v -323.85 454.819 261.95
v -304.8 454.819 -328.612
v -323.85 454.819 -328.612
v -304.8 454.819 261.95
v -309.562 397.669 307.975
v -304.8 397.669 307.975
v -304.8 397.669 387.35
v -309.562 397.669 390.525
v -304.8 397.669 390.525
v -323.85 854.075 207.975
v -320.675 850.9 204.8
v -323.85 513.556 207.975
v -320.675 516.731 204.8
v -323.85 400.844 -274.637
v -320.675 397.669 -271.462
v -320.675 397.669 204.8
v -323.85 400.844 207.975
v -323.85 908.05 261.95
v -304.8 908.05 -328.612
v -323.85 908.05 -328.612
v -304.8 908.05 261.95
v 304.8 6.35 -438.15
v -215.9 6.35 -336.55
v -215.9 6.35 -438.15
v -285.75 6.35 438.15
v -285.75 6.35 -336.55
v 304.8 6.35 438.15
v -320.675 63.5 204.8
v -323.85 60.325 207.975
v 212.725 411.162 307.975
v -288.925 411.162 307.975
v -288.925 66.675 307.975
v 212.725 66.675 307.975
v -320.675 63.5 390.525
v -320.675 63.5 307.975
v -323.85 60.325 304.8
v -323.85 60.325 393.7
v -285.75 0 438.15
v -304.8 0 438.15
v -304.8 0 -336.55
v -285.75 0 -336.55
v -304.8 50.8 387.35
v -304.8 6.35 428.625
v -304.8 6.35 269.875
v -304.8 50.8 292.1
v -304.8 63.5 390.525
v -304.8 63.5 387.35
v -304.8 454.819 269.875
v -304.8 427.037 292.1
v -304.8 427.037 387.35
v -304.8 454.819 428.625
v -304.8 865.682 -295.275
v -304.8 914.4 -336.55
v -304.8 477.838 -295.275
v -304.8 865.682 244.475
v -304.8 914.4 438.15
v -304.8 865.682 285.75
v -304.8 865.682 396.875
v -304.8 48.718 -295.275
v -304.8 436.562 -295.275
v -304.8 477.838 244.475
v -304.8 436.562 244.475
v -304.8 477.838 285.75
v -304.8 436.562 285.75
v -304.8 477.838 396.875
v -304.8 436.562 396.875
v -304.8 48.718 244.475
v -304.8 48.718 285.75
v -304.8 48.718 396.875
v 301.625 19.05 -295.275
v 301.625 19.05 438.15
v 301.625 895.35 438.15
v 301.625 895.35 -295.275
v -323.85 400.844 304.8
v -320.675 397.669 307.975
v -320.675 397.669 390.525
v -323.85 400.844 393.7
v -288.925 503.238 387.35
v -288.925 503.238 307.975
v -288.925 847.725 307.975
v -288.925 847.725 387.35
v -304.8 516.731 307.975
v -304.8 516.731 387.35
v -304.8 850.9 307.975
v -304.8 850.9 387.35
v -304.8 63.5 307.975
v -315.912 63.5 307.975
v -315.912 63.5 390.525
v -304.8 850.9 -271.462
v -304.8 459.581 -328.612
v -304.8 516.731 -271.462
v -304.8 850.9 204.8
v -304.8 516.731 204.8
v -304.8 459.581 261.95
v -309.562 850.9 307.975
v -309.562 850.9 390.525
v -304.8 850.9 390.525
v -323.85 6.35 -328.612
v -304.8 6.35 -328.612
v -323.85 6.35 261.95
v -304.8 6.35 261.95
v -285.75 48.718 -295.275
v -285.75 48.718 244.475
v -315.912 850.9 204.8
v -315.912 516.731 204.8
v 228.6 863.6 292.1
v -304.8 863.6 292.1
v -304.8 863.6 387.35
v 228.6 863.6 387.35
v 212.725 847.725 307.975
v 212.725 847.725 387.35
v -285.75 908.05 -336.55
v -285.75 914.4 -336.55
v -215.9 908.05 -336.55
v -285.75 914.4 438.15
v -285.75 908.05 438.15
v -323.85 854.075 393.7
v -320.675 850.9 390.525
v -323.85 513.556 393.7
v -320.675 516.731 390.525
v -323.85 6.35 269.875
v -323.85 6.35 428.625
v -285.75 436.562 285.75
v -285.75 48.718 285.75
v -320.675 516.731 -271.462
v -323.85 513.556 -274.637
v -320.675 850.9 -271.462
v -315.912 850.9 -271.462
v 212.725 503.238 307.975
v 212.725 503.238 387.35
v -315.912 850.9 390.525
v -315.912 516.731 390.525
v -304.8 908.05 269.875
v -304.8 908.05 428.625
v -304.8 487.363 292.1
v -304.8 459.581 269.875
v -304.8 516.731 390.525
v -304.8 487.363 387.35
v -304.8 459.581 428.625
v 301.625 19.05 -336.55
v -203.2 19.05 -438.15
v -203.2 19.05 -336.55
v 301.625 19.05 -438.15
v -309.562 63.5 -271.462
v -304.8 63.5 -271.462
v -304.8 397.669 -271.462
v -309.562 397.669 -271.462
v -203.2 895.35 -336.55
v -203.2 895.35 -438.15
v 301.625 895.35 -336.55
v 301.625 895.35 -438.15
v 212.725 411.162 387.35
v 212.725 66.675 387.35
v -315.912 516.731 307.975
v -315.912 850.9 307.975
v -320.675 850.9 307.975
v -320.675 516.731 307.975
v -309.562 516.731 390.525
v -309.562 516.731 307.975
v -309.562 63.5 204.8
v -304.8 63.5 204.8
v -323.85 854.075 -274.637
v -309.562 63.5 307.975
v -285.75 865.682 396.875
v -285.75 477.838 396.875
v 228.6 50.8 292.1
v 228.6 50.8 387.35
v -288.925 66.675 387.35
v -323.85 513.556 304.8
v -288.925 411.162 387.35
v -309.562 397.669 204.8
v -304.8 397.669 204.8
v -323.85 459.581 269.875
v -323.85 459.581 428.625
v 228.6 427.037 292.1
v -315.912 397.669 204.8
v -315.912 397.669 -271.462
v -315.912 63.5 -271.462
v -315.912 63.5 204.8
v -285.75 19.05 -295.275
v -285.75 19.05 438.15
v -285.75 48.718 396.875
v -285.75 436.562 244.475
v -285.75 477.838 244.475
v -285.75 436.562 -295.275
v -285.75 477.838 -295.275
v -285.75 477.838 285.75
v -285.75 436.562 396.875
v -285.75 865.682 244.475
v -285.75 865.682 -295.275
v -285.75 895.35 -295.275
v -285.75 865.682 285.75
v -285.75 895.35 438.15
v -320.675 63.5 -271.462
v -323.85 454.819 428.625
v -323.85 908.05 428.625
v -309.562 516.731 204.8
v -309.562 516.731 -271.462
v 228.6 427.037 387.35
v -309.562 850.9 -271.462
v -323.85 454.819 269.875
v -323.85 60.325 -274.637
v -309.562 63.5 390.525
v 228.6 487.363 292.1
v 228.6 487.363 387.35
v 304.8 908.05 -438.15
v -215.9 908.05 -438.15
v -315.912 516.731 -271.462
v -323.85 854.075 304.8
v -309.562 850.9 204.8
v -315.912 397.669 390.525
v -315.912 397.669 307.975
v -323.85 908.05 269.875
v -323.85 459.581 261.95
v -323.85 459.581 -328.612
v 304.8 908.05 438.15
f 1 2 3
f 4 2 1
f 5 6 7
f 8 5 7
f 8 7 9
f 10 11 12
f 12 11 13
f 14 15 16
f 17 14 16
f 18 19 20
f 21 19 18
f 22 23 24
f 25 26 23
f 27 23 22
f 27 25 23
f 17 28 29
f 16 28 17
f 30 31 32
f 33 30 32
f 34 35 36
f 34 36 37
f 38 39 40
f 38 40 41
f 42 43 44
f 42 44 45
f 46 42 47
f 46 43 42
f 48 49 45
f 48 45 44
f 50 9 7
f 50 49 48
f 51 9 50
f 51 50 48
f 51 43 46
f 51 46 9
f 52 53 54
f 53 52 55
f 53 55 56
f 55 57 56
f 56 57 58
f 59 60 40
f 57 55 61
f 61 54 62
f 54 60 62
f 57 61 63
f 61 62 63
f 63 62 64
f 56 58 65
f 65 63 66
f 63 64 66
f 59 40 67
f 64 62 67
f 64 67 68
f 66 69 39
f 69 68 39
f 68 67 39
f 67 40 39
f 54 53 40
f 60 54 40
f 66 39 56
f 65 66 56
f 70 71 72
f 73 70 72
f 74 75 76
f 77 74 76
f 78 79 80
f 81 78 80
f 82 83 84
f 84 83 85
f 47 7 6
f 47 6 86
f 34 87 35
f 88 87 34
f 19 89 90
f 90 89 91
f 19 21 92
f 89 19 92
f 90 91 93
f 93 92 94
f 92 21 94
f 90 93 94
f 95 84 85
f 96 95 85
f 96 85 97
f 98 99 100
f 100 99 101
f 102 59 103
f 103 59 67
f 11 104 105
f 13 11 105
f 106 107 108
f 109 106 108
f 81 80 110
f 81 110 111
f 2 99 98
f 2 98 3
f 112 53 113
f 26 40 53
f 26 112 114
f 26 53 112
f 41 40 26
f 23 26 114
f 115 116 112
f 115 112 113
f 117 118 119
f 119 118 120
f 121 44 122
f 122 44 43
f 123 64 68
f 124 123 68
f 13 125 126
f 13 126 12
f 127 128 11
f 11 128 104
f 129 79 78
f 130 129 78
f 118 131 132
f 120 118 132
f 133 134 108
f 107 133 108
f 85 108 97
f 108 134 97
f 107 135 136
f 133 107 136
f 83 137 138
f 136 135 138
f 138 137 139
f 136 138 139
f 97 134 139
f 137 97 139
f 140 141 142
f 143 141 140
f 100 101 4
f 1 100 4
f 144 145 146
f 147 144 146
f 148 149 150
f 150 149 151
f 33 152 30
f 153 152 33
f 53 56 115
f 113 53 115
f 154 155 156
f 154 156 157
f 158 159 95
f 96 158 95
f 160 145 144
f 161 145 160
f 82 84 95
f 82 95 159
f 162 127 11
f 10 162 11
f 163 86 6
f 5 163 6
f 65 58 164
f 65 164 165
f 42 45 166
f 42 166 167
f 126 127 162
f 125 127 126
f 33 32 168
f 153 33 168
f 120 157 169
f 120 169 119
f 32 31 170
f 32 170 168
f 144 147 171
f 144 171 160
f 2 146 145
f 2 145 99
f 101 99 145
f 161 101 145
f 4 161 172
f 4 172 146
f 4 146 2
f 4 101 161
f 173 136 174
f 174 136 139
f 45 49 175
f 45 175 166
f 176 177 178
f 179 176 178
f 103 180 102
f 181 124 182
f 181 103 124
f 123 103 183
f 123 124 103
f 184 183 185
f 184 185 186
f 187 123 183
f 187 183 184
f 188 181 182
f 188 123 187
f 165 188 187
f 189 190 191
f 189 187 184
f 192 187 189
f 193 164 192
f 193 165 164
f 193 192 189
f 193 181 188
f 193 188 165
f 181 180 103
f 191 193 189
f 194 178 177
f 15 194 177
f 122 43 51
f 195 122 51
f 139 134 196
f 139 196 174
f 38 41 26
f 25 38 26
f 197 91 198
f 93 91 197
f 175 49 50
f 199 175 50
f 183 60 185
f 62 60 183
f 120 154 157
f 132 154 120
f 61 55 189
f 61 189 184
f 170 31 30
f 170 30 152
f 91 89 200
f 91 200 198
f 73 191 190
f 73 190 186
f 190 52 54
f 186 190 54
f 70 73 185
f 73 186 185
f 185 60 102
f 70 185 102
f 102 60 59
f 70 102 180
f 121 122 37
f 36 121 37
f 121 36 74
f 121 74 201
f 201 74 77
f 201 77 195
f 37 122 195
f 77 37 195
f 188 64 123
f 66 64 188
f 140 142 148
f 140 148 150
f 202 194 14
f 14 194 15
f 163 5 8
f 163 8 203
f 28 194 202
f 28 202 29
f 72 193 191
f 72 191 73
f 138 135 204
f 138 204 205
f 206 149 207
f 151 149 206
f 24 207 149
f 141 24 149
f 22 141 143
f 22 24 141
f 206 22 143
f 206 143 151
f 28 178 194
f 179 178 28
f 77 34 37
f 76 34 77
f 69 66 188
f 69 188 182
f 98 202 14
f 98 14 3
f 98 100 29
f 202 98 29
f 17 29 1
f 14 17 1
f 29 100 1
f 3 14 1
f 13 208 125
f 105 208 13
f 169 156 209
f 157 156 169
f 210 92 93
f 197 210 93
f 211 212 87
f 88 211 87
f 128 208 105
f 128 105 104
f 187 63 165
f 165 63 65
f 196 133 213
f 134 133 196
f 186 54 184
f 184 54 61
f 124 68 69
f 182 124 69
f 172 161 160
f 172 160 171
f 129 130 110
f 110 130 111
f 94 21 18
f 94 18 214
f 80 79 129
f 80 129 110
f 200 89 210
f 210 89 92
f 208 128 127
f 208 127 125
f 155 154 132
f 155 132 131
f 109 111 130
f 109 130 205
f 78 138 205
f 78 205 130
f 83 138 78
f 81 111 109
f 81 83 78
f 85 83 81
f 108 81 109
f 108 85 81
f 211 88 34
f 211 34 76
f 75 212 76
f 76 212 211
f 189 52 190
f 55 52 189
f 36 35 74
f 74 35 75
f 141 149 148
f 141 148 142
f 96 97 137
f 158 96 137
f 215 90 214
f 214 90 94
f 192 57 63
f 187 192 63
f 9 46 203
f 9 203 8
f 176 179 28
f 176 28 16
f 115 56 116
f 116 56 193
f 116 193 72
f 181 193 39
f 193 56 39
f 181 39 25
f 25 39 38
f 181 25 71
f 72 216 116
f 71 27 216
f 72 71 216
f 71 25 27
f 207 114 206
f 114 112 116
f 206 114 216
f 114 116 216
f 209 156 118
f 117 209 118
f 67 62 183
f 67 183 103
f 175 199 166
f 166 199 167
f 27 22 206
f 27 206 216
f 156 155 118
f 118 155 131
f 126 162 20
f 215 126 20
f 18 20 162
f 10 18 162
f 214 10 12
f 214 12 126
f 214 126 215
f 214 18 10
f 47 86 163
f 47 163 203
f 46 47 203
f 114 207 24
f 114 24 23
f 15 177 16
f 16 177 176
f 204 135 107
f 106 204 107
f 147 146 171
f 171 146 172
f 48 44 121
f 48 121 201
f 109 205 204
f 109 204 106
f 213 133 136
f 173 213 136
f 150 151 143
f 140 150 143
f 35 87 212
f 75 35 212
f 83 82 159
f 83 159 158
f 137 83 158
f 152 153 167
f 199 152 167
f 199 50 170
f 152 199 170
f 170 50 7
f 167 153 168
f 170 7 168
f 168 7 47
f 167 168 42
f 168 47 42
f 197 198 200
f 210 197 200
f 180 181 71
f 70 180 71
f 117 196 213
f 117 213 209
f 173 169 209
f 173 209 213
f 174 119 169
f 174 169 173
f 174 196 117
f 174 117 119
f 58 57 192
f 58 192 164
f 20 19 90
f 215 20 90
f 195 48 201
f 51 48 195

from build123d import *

# Parameters (mm, degrees)
F0_W          = 609.6
F0_H          = 876.3
F1_DEPTH      = 914.4
F2_W          = 88.9
F2_H          = 101.6
F3_DEPTH      = 914.401
F4_W          = 816.9639344262
F4_H          = 692.15
F5_DEPTH      = 19.05
F6_W          = 590.55
F6_H          = 6.35
F7_DEPTH      = 876.301
F8_W          = 587.375
F8_H          = 876.3
F9_DEPTH      = 733.425
F10_W         = 387.8444672131
F10_H         = 41.275
F10_W_2       = 41.275
F10_H_2       = 111.125
F10_H_3       = 539.75
F11_DEPTH     = 19.05
F12_W         = 448.46875
F12_H         = 590.5627
F12_W_2       = 334.16875
F12_H_2       = 476.2627
F13_DEPTH     = 19.05
F14_W         = 6.35
F14_H         = 334.16875
F15_DEPTH     = 476.2627
F16_SIZE      = 3.175
F17_W         = 448.46875
F17_H         = 158.75
F17_W_2       = 334.16875
F17_H_2       = 82.55
F18_DEPTH     = 19.05
F19_W         = 6.35
F19_H         = 334.16875
F20_DEPTH     = 82.55
F21_SIZE      = 3.175
F22_W         = 504.825
F22_H         = 876.3
F23_DEPTH     = 101.6
F24_W         = 376.2375
F24_H         = 95.25
F25_DEPTH     = 533.4
F26_T         = 15.875
F26_T3_DEPTH  = 37.249261314
F26_T5_DEPTH  = 37.249261314
F26_T7_DEPTH  = 37.249261314
F26_T9_DEPTH  = 37.249261314
F26_T11_DEPTH = 36.5125
F26_T13_DEPTH = 365.91875
F26_T15_DEPTH = 114.3
F26_T17_DEPTH = 127
F26_T19_DEPTH = 407.9875
F26_T21_DEPTH = 111.125
F26_T23_DEPTH = 36.5125


# Not quite as in the source:
# - a shell that OpenCascade refuses in one call is made with other operations: the cavity is built on its own and cut out


with BuildPart() as f1:
    # F0 (on Front) → F1 (new body)
    with BuildSketch(Plane.XZ):
        Rectangle(F0_W, F0_H)
    extrude(amount=-F1_DEPTH)

    # F2 (on face) → F3 (cut, through all)
    with BuildSketch(Plane.XZ):
        with Locations((-260.35, -387.35)):
            Rectangle(F2_W, F2_H)
    extrude(amount=-F3_DEPTH, mode=Mode.SUBTRACT)

    # F4 (on face) → F5 (cut)
    with BuildSketch(Plane(origin=(-304.8, 0, 0), x_dir=(0, -1, 0), z_dir=(-1, 0, 0))):
        with Locations((-457.2, 50.8)):
            Rectangle(F4_W, F4_H)
    extrude(amount=-F5_DEPTH, mode=Mode.SUBTRACT)

    # F6 (on face) → F7 (cut, through all)
    with BuildSketch(Plane.XY.offset(438.15)):
        with Locations((9.525, 911.225)):
            Rectangle(F6_W, F6_H)
        with Locations((9.525, 3.175)):
            Rectangle(F6_W, F6_H)
    extrude(amount=-F7_DEPTH, mode=Mode.SUBTRACT)

    # F8 (on face) → F9 (cut, through all)
    with BuildSketch(Plane.XY.offset(438.15)):
        with Locations((7.9375, 457.2)):
            Rectangle(F8_W, F8_H)
    extrude(amount=-F9_DEPTH, mode=Mode.SUBTRACT)

    # F10 (on face) → F11 (join, through all)
    with BuildSketch(Plane(origin=(-304.8, 0, 0), x_dir=(0, -1, 0), z_dir=(-1, 0, 0))):
        with Locations((-671.7597336066, 265.1125)):
            Rectangle(F10_W, F10_H)
        with Locations((-457.2, 341.3125)):
            Rectangle(F10_W_2, F10_H_2)
        with Locations((-457.2, 265.1125)):
            Rectangle(F10_W_2, F10_H)
        with Locations((-242.6402663934, 265.1125)):
            Rectangle(F10_W, F10_H)
        with Locations((-457.2, -25.4)):
            Rectangle(F10_W_2, F10_H_3)
    extrude(amount=-F11_DEPTH)

    # F22 (on face) → F23 (cut)
    with BuildSketch(Plane(origin=(0, 0, -438.15), x_dir=(1, 0, 0), z_dir=(0, 0, -1))):
        with Locations((49.2125, -457.2)):
            Rectangle(F22_W, F22_H)
    extrude(amount=-F23_DEPTH, mode=Mode.SUBTRACT)


with BuildPart() as f13:
    # F12 (on face) → F13 (new body)
    with BuildSketch(Plane(origin=(-304.8, 0, 0), x_dir=(0, -1, 0), z_dir=(-1, 0, 0))):
        with Locations((-683.815625, -33.33115)):
            Rectangle(F12_W, F12_H)
        with Locations((-683.815625, -33.33115)):
            Rectangle(F12_W_2, F12_H_2, mode=Mode.SUBTRACT)
    extrude(amount=F13_DEPTH)

    # F14 (on face) → F15 (join, through all)
    with BuildSketch(Plane.XY.offset(-271.4625)):
        with Locations((-312.7375, 683.815625)):
            Rectangle(F14_W, F14_H)
    extrude(amount=F15_DEPTH)

    # F16
    f16_edges = [f13.edges().sort_by_distance(p)[0] for p in [
        (-323.85, 850.9, -33.33115),
        (-323.85, 683.815625, -271.4625),
        (-323.85, 516.73125, -33.33115),
        (-323.85, 683.815625, 204.8002),
    ]]
    chamfer(f16_edges, length=F16_SIZE)


with BuildPart() as f18:
    # F17 (on face) → F18 (new body)
    with BuildSketch(Plane(origin=(-304.8, 0, 0), x_dir=(0, -1, 0), z_dir=(-1, 0, 0))):
        with Locations((-683.815625, 349.25)):
            Rectangle(F17_W, F17_H)
        with Locations((-683.815625, 349.25)):
            Rectangle(F17_W_2, F17_H_2, mode=Mode.SUBTRACT)
    extrude(amount=F18_DEPTH)

    # F19 (on face) → F20 (join, through all)
    with BuildSketch(Plane.XY.offset(307.975)):
        with Locations((-312.7375, 683.815625)):
            Rectangle(F19_W, F19_H)
    extrude(amount=F20_DEPTH)

    # F21
    f21_edges = [f18.edges().sort_by_distance(p)[0] for p in [
        (-323.85, 683.815625, 307.975),
        (-323.85, 850.9, 349.25),
        (-323.85, 683.815625, 390.525),
        (-323.85, 516.73125, 349.25),
    ]]
    chamfer(f21_edges, length=F21_SIZE)

    # F24 (on face) → F25 (join)
    with BuildSketch(Plane.YZ.offset(-304.8)):
        with Locations((675.48125, 339.725)):
            Rectangle(F24_W, F24_H)
    extrude(amount=F25_DEPTH)

    # F26: shell of thickness 15.875, made by hand


with BuildPart() as f26_core1:
    # F26_t2: copy of F18
    add(f18.part)

    # the walls: a layer under each face that stays
    f26_faces = [f26_core1.faces().sort_by_distance(p)[0] for p in [
        (-323.85, 833.3052083333, 296.3333333333),
        (-322.2625, 683.815625, 306.3875),
        (-322.2625, 515.14375, 349.25),
        (-322.2625, 852.4875, 349.25),
        (-322.2625, 683.815625, 392.1125),
        (-314.325, 683.815625, 428.625),
        (-314.325, 908.05, 349.25),
        (-314.325, 683.815625, 269.875),
        (-314.325, 459.58125, 349.25),
        (-318.29375, 683.815625, 307.975),
        (-318.29375, 516.73125, 349.25),
        (-318.29375, 850.9, 349.25),
        (-318.29375, 683.815625, 390.525),
        (-304.8, 833.3052083333, 402.1666666667),
        (-315.9125, 683.815625, 349.25),
        (-38.1, 863.6, 339.725),
        (-38.1, 675.48125, 292.1),
        (-38.1, 487.3625, 339.725),
        (-307.18125, 516.73125, 349.25),
        (-307.18125, 683.815625, 390.525),
        (-307.18125, 850.9, 349.25),
        (-304.8, 683.815625, 347.6625),
        (228.6, 675.48125, 339.725),
        (-307.18125, 683.815625, 307.975),
        (-309.5625, 683.815625, 349.25),
    ]]
    thicken(f26_faces, amount=-F26_T, mode=Mode.SUBTRACT)

    # F26_s4 → F26_t3 (cut)
    with BuildSketch(Plane(origin=(155.6699811433, 155.6699811433, 155.6699811433), x_dir=(-0.7071067812, 0.7071067812, 0), z_dir=(0.5773502692, 0.5773502692, 0.5773502692))):
        Polygon((592.373762983, 171.5583871468), (584.198137983, 157.6727523289), (576.260637983, 162.2554700906), (576.260637983, 171.420905614), align=None)
    extrude(amount=F26_T3_DEPTH, mode=Mode.SUBTRACT)

    # F26_s6 → F26_t5 (cut)
    with BuildSketch(Plane(origin=(-300.2071021901, 300.20710219, -300.2071021901), x_dir=(0.7071067812, 0.7071067812, 0), z_dir=(0.5773502692, -0.5773502692, 0.5773502692))):
        Polygon((374.6875680546, 729.8915069443), (382.8631930546, 716.0058721263), (390.8006930546, 720.588589888), (390.8006930546, 729.7540254114), align=None)
    extrude(amount=F26_T5_DEPTH, mode=Mode.SUBTRACT)

    # F26_s8 → F26_t7 (cut)
    with BuildSketch(Plane(origin=(-77.1633521901, -77.1633521901, 77.1633521901), x_dir=(-0.7071067812, 0.7071067812, 0), z_dir=(0.5773502692, 0.5773502692, -0.5773502692))):
        Polygon((592.373762983, 398.7644746312), (576.260637983, 398.9019561641), (576.260637983, 408.0673916874), (584.198137983, 412.6501094491), align=None)
    extrude(amount=F26_T7_DEPTH, mode=Mode.SUBTRACT)

    # F26_s10 → F26_t9 (cut)
    with BuildSketch(Plane(origin=(-533.0404355234, 533.0404355234, 533.0404355234), x_dir=(0.7071067812, 0.7071067812, 0), z_dir=(0.5773502692, -0.5773502692, -0.5773502692))):
        Polygon((374.6875680546, -159.5686451663), (390.8006930546, -159.4311636334), (390.8006930546, -150.26572811), (382.8631930546, -145.6830103483), align=None)
    extrude(amount=F26_T9_DEPTH, mode=Mode.SUBTRACT)

    # F26_s12 → F26_t11 (cut)
    with BuildSketch(Plane.YZ.offset(-336.55)):
        Polygon((850.74125, 308.13375), (850.9, 292.1), (866.775, 292.1), (866.775, 307.975), align=None)
        Polygon((516.89, 308.13375), (516.73125, 292.1), (500.85625, 292.1), (500.85625, 307.975), align=None)
        Polygon((516.89, 390.36625), (500.85625, 390.525), (500.85625, 406.4), (516.73125, 406.4), align=None)
        Polygon((850.74125, 390.36625), (866.775, 390.525), (866.775, 406.4), (850.9, 406.4), align=None)
    extrude(amount=F26_T11_DEPTH, mode=Mode.SUBTRACT)

    # F26_s14 → F26_t13 (cut)
    with BuildSketch(Plane.XZ.offset(-866.775)):
        Polygon((-316.07125, 308.13375), (-315.9125, 292.1), (-300.0375, 292.1), (-300.0375, 307.975), align=None)
        Polygon((-316.07125, 390.36625), (-315.9125, 406.4), (-300.0375, 406.4), (-300.0375, 390.525), align=None)
        Polygon((-309.40375, 390.36625), (-309.5625, 406.4), (-325.4375, 406.4), (-325.4375, 390.525), align=None)
        Polygon((-304.95875, 308.13375), (-288.925, 307.975), (-288.925, 292.1), (-304.8, 292.1), align=None)
        Polygon((-309.40375, 308.13375), (-309.5625, 292.1), (-325.4375, 292.1), (-325.4375, 307.975), align=None)
    extrude(amount=F26_T13_DEPTH, mode=Mode.SUBTRACT)

    # F26_s16 → F26_t15 (cut)
    with BuildSketch(Plane.XY.offset(292.1)):
        Polygon((-316.07125, 516.89), (-315.9125, 500.85625), (-300.0375, 500.85625), (-300.0375, 516.73125), align=None)
        Polygon((-316.07125, 850.74125), (-315.9125, 866.775), (-300.0375, 866.775), (-300.0375, 850.9), align=None)
        Polygon((-309.40375, 516.89), (-309.5625, 500.85625), (-325.4375, 500.85625), (-325.4375, 516.73125), align=None)
        Polygon((-309.40375, 850.74125), (-309.5625, 866.775), (-325.4375, 866.775), (-325.4375, 850.9), align=None)
    extrude(amount=F26_T15_DEPTH, mode=Mode.SUBTRACT)

    # F26_s18 → F26_t17 (cut)
    with BuildSketch(Plane.XY.offset(276.225)):
        Polygon((-304.64125, 863.75875), (-320.675, 863.6), (-320.675, 847.725), (-304.8, 847.725), align=None)
        Polygon((-304.64125, 487.20375), (-320.675, 487.3625), (-320.675, 503.2375), (-304.8, 503.2375), align=None)
    extrude(amount=F26_T17_DEPTH, mode=Mode.SUBTRACT)

    # F26_s20 → F26_t19 (cut)
    with BuildSketch(Plane.XZ.offset(-879.475)):
        Polygon((-304.64125, 291.94125), (-320.675, 292.1), (-320.675, 307.975), (-304.8, 307.975), align=None)
    extrude(amount=F26_T19_DEPTH, mode=Mode.SUBTRACT)

    # F26_s22 → F26_t21 (cut)
    with BuildSketch(Plane.XY.offset(292.1)):
        Polygon((-304.95875, 516.89), (-304.8, 500.85625), (-288.925, 500.85625), (-288.925, 516.73125), align=None)
        Polygon((-304.95875, 850.74125), (-304.8, 866.775), (-288.925, 866.775), (-288.925, 850.9), align=None)
    extrude(amount=F26_T21_DEPTH, mode=Mode.SUBTRACT)

    # F26_s24 → F26_t23 (cut)
    with BuildSketch(Plane.YZ.offset(-325.4375)):
        Polygon((516.89, 308.13375), (500.85625, 307.975), (500.85625, 292.1), (516.73125, 292.1), align=None)
        Polygon((516.89, 390.36625), (500.85625, 390.525), (500.85625, 406.4), (516.73125, 406.4), align=None)
        Polygon((850.74125, 390.36625), (850.9, 406.4), (866.775, 406.4), (866.775, 390.525), align=None)
        Polygon((850.74125, 308.13375), (866.775, 307.975), (866.775, 292.1), (850.9, 292.1), align=None)
    extrude(amount=F26_T23_DEPTH, mode=Mode.SUBTRACT)


with BuildPart() as f18_1:
    add(f18.part)

    # what is left inside the walls is the cavity
    f26_cavity = [f26_core1.part.solids().sort_by_distance(p)[0] for p in [
        (45.508333, 675.48125, 308.13375),
    ]]
    add(f26_cavity, mode=Mode.SUBTRACT)


with BuildPart() as f28_1:
    # F28: instance of F18
    add(f18_1.part.mirror(Plane.XZ.offset(-457.2)))


with BuildPart() as f29_1:
    # F29: instance of F13
    add(f13.part.mirror(Plane.XZ.offset(-457.2)))


solid = Compound([f1.part, f13.part, f18_1.part, f28_1.part, f29_1.part])
